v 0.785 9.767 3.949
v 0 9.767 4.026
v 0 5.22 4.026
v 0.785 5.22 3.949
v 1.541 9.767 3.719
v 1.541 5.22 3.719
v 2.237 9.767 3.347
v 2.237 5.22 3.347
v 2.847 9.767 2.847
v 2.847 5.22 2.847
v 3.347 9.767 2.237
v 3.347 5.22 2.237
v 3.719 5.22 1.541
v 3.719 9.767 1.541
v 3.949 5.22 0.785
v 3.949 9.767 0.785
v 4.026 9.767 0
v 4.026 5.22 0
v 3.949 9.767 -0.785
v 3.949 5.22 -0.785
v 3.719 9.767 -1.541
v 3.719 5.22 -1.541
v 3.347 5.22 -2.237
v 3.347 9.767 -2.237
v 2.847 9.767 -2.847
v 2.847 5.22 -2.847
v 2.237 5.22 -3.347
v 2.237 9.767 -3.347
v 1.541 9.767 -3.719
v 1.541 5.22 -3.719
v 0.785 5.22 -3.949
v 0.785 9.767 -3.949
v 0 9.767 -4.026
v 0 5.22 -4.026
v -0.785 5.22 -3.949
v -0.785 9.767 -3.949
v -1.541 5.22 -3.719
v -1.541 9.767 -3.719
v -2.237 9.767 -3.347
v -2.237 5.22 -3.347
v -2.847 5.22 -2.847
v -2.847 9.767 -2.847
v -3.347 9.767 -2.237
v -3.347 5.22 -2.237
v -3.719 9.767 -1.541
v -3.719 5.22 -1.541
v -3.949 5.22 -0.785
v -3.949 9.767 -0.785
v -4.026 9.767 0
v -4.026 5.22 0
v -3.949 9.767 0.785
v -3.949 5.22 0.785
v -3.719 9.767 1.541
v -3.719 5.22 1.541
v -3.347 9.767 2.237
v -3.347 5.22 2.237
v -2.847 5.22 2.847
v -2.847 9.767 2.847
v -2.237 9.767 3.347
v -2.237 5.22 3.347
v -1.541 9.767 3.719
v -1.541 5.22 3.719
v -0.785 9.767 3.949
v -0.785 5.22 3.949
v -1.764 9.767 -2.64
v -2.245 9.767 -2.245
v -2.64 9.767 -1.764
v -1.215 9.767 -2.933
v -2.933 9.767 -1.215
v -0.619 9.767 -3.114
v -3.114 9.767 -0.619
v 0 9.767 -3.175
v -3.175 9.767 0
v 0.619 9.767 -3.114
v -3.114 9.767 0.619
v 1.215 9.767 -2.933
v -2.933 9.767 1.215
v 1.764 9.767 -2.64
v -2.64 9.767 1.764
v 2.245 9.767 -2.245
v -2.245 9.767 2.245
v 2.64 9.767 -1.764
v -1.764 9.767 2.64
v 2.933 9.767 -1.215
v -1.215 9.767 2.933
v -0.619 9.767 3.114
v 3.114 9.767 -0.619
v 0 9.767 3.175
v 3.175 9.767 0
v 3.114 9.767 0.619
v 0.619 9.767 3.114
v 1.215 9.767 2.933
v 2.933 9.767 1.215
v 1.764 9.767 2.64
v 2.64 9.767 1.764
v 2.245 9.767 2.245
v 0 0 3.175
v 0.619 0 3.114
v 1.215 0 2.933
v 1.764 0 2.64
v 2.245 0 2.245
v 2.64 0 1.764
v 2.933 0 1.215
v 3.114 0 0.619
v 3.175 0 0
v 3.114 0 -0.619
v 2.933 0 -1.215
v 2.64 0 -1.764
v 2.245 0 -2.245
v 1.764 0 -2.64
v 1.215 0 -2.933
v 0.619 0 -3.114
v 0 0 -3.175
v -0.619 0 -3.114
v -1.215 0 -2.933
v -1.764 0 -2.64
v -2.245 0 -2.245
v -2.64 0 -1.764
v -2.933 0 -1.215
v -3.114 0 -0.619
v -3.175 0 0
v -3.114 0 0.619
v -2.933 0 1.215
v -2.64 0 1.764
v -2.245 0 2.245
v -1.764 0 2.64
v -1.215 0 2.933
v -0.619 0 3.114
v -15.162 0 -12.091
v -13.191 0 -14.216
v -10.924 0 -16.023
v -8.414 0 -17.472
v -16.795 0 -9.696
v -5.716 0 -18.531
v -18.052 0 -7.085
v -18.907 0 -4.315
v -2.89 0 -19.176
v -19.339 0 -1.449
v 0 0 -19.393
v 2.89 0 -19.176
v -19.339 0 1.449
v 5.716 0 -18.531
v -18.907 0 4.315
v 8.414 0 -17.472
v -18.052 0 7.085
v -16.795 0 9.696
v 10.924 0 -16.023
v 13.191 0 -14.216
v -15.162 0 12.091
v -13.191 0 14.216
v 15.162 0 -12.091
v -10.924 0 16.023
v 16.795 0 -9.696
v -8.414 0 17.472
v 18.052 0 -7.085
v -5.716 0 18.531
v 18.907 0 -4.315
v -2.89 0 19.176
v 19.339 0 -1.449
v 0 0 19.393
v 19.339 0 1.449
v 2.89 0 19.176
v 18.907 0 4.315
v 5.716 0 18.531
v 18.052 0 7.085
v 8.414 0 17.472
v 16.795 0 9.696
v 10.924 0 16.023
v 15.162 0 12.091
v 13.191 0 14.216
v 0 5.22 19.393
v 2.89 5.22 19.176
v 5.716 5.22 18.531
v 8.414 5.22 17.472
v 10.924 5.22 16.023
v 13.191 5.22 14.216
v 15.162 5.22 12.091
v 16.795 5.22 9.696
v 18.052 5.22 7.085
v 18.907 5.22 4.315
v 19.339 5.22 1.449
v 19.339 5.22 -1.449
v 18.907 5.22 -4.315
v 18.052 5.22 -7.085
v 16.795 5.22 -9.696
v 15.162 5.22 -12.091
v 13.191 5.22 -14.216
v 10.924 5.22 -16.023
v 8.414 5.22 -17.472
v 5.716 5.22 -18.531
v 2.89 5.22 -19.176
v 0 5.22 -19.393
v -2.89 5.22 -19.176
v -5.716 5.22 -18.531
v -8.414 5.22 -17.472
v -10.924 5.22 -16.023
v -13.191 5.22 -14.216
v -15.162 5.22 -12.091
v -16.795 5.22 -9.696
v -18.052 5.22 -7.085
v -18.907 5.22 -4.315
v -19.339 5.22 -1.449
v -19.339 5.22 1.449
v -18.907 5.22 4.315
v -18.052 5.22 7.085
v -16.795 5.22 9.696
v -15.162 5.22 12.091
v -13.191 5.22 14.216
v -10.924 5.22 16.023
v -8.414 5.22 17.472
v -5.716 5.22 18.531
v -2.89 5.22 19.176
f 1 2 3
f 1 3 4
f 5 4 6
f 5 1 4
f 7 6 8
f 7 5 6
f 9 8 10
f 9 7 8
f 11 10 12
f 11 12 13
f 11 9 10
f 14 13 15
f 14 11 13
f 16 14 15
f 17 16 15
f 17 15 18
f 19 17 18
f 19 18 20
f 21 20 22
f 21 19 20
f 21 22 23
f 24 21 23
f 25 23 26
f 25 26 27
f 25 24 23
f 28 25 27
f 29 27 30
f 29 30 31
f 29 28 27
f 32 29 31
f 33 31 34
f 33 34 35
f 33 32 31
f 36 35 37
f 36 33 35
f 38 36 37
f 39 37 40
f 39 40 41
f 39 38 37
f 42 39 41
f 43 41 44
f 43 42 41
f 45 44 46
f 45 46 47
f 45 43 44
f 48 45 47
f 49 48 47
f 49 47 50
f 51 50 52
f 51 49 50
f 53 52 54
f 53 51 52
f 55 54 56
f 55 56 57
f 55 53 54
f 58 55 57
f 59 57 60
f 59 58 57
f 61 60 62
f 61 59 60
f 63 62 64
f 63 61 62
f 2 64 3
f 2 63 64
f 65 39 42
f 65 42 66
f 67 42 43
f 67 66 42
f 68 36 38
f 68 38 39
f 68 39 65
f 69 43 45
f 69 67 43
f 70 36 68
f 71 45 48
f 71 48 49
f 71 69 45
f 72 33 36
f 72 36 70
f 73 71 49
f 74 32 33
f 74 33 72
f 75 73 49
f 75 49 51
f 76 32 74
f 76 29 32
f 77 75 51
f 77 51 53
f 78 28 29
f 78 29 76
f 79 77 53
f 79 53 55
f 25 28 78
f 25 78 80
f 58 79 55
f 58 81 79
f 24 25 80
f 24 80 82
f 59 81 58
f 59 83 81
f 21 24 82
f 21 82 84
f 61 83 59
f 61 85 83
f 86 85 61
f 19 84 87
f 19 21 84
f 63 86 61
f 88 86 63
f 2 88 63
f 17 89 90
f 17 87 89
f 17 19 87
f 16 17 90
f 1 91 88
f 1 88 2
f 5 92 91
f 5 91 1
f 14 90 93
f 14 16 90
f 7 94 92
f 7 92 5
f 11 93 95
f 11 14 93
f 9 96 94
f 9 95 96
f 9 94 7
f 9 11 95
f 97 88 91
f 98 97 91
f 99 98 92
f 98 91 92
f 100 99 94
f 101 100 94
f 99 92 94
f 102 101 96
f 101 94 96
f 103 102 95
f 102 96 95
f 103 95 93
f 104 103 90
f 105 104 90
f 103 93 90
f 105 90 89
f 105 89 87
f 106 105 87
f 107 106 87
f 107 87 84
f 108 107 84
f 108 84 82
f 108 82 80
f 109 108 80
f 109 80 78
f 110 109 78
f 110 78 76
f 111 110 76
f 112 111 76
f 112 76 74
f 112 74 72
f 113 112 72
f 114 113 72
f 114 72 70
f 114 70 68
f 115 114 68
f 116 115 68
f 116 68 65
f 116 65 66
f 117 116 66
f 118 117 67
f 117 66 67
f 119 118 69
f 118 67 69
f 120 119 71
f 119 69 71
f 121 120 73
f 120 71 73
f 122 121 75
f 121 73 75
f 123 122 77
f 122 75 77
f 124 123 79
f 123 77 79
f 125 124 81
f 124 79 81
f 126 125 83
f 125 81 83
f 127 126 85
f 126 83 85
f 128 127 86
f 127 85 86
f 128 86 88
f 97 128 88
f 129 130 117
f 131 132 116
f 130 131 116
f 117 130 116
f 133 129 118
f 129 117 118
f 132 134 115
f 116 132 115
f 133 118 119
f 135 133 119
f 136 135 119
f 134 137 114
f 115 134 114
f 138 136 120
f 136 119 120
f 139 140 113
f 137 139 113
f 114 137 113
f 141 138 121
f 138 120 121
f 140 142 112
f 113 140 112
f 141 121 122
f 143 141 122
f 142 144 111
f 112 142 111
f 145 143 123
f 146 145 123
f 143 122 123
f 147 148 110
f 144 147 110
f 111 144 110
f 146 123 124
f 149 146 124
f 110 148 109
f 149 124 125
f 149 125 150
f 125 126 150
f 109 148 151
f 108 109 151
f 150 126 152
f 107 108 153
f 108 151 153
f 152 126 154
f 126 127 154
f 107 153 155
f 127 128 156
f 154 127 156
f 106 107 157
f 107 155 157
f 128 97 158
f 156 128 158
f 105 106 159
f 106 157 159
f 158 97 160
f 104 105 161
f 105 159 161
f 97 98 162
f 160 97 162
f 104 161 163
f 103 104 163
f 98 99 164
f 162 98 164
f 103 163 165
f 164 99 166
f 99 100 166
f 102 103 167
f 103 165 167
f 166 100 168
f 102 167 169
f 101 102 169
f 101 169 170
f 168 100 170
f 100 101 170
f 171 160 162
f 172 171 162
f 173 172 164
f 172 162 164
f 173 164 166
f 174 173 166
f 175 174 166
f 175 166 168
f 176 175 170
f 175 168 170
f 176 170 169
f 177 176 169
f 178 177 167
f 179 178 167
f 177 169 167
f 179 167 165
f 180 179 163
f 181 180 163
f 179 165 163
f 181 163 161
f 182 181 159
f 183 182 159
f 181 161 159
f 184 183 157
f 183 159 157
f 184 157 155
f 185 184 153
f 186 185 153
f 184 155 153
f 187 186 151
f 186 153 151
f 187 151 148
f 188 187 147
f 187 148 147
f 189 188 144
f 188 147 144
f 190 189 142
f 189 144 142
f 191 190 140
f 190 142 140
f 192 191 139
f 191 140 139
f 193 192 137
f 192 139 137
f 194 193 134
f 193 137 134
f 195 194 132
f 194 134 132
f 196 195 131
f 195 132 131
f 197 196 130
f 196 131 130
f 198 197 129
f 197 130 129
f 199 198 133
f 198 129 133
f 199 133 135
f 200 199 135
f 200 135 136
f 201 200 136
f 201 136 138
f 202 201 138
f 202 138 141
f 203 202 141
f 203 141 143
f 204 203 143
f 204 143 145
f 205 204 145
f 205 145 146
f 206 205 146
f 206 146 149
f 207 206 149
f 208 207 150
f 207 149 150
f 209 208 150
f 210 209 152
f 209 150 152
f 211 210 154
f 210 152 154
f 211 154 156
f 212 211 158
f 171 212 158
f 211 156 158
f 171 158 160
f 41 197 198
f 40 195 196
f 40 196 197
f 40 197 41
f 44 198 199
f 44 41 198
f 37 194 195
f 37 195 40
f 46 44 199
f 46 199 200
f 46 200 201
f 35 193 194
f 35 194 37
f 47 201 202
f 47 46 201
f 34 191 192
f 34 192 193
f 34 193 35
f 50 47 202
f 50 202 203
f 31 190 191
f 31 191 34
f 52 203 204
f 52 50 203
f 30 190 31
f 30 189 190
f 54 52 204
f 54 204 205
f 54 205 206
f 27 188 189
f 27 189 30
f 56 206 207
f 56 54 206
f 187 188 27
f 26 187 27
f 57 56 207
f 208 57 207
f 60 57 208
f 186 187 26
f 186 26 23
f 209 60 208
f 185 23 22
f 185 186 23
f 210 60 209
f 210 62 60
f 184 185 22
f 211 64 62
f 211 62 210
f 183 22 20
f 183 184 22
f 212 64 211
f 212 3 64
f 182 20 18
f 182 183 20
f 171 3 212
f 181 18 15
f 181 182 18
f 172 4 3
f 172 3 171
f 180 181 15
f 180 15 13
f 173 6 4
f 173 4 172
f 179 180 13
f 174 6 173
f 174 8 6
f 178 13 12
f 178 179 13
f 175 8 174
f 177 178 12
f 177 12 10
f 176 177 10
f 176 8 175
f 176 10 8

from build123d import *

# Parameters (mm, degrees)
SKETCH1_R           = 19.3929
BOSS_EXTRUDE1_DEPTH = 5.22
SKETCH2_R           = 3.175
CUT_EXTRUDE1_DEPTH  = 28.918050448
BOSS_EXTRUDE2_START = 4.5466
SKETCH3_R           = 4.0259
SKETCH3_R_2         = 3.175
BOSS_EXTRUDE2_DEPTH = 4.5466


with BuildPart() as part:
    # Sketch1 → Boss-Extrude1 (new body)
    with BuildSketch(Plane(origin=(0, 0, 0), x_dir=(1, 0, 0), z_dir=(0, 1, 0))):
        with Locations(Location((0, 0, 0), (0, 0, 270))):
            Circle(SKETCH1_R)
    extrude(amount=BOSS_EXTRUDE1_DEPTH)

    # Sketch2 → Cut-Extrude1 (cut, through all)
    with BuildSketch(Plane(origin=(0, 5.22, 0), x_dir=(1, 0, 0), z_dir=(0, 1, 0))):
        with Locations(Location((0, 0, 0), (0, 0, 270))):
            Circle(SKETCH2_R)
    extrude(amount=-CUT_EXTRUDE1_DEPTH, mode=Mode.SUBTRACT)

    # Sketch3 → Boss-Extrude2 (add)
    with BuildSketch(Plane(origin=(0, 5.22, 0), x_dir=(1, 0, 0), z_dir=(0, 1, 0)).offset(BOSS_EXTRUDE2_START)):
        with Locations(Location((0, 0, 0), (0, 0, 270))):
            Circle(SKETCH3_R)
        with Locations(Location((0, 0, 0), (0, 0, 270))):
            Circle(SKETCH3_R_2, mode=Mode.SUBTRACT)
    extrude(amount=-BOSS_EXTRUDE2_DEPTH)


solid = part.part
